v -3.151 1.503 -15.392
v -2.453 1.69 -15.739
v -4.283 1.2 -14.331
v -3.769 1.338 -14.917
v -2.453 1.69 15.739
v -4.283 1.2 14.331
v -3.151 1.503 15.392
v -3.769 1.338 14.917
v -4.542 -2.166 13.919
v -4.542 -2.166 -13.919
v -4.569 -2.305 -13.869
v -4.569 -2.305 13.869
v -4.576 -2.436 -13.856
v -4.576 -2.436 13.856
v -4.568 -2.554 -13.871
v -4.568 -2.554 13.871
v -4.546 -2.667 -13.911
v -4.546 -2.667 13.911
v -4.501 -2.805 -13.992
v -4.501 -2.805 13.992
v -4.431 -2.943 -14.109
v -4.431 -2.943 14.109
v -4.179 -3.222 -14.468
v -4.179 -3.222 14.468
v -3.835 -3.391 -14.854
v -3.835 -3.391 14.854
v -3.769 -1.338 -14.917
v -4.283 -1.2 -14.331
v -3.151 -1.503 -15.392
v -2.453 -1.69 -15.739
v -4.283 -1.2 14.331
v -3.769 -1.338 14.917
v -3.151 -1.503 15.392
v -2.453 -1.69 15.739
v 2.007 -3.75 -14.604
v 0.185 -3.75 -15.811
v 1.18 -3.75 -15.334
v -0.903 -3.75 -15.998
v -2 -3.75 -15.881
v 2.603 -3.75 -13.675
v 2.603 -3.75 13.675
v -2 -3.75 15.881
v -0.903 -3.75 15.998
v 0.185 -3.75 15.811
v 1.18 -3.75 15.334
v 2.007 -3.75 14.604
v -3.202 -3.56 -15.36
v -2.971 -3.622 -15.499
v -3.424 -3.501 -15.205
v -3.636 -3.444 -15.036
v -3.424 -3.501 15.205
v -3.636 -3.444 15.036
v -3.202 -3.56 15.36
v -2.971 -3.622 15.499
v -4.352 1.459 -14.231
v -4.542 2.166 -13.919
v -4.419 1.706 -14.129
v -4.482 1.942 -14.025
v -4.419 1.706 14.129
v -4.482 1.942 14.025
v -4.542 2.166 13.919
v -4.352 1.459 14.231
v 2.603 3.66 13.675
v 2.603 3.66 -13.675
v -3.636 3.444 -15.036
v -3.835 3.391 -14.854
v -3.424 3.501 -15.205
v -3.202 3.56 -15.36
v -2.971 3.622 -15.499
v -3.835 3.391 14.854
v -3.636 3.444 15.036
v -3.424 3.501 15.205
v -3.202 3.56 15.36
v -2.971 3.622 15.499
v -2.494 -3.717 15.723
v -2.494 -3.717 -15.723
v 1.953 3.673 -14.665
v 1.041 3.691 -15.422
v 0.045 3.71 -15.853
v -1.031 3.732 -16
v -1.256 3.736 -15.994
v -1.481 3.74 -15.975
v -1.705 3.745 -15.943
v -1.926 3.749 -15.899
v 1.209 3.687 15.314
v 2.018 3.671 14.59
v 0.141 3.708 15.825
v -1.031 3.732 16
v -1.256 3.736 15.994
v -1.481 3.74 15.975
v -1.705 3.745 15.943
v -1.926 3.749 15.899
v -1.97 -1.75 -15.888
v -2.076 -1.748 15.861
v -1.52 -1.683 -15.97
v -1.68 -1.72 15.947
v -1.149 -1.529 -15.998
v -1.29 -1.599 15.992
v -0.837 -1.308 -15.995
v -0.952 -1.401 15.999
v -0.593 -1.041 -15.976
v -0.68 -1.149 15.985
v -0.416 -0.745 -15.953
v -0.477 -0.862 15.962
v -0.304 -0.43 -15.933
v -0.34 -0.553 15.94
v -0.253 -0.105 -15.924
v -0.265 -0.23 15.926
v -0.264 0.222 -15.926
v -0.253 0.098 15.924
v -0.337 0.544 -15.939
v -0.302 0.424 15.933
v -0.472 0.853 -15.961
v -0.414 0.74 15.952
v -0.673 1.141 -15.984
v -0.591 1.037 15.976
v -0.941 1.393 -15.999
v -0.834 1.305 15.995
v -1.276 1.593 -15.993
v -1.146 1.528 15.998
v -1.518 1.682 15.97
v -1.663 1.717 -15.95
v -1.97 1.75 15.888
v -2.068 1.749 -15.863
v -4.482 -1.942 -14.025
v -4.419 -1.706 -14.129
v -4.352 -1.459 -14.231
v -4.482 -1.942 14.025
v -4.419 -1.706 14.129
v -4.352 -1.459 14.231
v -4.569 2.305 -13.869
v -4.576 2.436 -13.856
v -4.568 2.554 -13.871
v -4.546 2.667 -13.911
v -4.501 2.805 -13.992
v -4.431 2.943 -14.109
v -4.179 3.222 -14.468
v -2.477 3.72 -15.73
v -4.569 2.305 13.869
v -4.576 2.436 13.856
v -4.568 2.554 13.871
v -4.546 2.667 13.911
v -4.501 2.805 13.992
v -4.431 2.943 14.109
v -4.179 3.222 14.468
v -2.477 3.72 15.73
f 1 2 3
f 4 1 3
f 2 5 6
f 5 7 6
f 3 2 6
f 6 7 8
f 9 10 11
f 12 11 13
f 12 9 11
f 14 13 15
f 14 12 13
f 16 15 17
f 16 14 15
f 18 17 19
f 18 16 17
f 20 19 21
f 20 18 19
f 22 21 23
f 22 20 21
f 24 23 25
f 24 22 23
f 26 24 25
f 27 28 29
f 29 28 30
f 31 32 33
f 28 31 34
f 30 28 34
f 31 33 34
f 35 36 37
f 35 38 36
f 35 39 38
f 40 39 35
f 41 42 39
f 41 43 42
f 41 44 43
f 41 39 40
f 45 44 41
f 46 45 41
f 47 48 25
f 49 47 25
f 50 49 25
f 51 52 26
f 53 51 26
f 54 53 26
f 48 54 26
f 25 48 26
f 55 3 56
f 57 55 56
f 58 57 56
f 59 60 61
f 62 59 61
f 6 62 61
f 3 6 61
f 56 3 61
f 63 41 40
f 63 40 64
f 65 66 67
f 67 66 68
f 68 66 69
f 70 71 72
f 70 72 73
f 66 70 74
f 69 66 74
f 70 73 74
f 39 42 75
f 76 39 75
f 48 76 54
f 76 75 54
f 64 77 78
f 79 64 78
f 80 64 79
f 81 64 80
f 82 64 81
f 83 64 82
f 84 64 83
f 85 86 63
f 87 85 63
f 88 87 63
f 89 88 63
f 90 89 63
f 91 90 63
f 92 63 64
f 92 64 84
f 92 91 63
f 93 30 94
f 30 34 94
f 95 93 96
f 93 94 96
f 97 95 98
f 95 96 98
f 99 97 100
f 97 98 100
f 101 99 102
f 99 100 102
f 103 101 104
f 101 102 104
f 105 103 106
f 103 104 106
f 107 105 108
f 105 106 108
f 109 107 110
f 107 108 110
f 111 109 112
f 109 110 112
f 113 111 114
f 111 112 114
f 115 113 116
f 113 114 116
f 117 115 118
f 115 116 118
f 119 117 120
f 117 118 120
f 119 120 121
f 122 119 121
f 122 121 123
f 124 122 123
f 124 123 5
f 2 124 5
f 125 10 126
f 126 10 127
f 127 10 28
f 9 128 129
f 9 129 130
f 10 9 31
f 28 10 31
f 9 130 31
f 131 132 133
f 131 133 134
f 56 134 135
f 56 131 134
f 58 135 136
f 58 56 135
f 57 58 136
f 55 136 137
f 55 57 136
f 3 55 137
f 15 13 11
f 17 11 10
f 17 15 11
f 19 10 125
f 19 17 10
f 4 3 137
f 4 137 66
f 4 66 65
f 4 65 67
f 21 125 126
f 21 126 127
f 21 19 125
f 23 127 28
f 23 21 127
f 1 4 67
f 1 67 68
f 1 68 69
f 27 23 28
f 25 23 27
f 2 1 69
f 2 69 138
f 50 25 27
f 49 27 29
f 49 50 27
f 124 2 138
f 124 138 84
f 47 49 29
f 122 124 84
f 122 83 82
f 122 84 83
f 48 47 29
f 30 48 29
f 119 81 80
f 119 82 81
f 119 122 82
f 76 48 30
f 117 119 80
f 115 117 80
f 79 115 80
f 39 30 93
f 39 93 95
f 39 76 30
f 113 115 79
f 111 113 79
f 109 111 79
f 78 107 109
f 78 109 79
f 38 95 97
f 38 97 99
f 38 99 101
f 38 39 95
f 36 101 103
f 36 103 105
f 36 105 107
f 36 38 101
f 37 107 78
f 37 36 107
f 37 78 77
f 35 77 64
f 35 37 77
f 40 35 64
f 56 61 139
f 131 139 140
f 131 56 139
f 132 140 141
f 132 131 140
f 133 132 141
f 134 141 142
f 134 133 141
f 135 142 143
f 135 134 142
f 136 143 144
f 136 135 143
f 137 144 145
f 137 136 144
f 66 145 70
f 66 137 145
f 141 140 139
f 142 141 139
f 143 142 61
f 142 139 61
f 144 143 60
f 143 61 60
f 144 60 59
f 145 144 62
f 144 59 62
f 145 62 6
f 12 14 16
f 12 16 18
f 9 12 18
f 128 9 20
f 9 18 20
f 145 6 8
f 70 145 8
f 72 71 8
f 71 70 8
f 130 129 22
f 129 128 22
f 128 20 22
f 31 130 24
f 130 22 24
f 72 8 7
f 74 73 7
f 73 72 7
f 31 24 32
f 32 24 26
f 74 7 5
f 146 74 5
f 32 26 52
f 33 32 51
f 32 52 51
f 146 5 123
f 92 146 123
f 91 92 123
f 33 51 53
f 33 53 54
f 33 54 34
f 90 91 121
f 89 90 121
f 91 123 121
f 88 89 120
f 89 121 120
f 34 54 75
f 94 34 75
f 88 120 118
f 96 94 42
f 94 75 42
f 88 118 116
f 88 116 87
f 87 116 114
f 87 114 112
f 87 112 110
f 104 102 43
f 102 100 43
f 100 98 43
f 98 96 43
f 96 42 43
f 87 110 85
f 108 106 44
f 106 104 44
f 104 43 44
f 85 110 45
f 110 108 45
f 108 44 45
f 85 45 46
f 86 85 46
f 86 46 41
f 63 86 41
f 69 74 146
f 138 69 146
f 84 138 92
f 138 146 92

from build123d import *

# Parameters (mm, degrees)
EXTRUDE_THIN1_DEPTH     = 16
BOSS_EXTRUDE2_DEPTH     = 16
FILLET1_R               = 1
CUT_EXTRUDE2_DEPTH      = 18.058758847
CUT_EXTRUDE2_DEPTH_BACK = 18.058758847


# Read off the part's stored shape, not the designer's step: Imported1
with BuildPart() as part:
    # Sketch2 → Extrude-Thin1 (new, symmetric)
    with BuildSketch(Plane.XY):
        with BuildLine():
            Line((-4.282991407, -1.199997312), (-2.45293323, -1.69036477))
            ThreePointArc((-2.45293323, -1.69036477), (-0.24999913, 2.688e-06), (-2.45293323, 1.690370147))
            Line((-2.45293323, 1.690370147), (-4.282991407, 1.200002688))
            Line((-4.282991407, 1.200002688), (-4.800634272, 3.131853062))
            Line((-4.800634272, 3.131853062), (-2.970575647, 3.62222064))
            ThreePointArc((-2.970575647, 3.62222064), (1.75000087, 2.688e-06), (-2.970575649, -3.622215263))
            Line((-2.970575649, -3.622215263), (-4.800634272, -3.131847685))
            Line((-4.800634272, -3.131847685), (-4.282991407, -1.199997312))
        make_face()
    extrude(amount=EXTRUDE_THIN1_DEPTH, both=True)

    # Sketch4 → Boss-Extrude2 (add, symmetric)
    with BuildSketch(Plane.XY):
        with BuildLine():
            Line((2.602765718, -3.74999537), (2.602765718, 3.659682334))
            Line((2.602765718, 3.659682334), (-1.925829051, 3.749267219))
            ThreePointArc((-1.925829051, 3.749267219), (1.749817484, -0.037083193), (-1.999997188, -3.74999537))
            Line((-1.999997188, -3.74999537), (2.602765718, -3.74999537))
        make_face()
    extrude(amount=BOSS_EXTRUDE2_DEPTH, both=True)

    # Fillet1
    fillet1_edges = [part.edges().sort_by_distance(p)[0] for p in [
        (-4.800634272, 3.131853062, 0),
        (-4.800634272, -3.131847685, 0),
    ]]
    fillet(fillet1_edges, radius=FILLET1_R)

    # Sketch3 → Cut-Extrude2 (cut, two sides: drawn at the far end of the back side and taken through both)
    with BuildSketch(Plane(origin=(0, 0, 0), x_dir=(1, 0, 0), z_dir=(0, 1, 0)).offset(-CUT_EXTRUDE2_DEPTH_BACK)):
        with BuildLine():
            Line((2.738864814, 13.342061251), (2.738864814, 18.762901752))
            Line((2.738864814, 18.762901752), (-4.800634272, 18.762901752))
            Line((-4.800634272, 18.762901752), (-4.800634272, 13.342061251))
            ThreePointArc((-4.800634272, 13.342061251), (-1.030884729, 16), (2.738864814, 13.342061251))
        make_face()
        with BuildLine():
            Line((-4.800634272, -18.762901752), (-4.800634272, -13.342061251))
            ThreePointArc((-4.800634272, -13.342061251), (-1.030884729, -16), (2.738864814, -13.342061251))
            Line((2.738864814, -13.342061251), (2.738864814, -18.762901752))
            Line((2.738864814, -18.762901752), (-4.800634272, -18.762901752))
        make_face()
    extrude(amount=CUT_EXTRUDE2_DEPTH + CUT_EXTRUDE2_DEPTH_BACK, mode=Mode.SUBTRACT)


solid = part.part
